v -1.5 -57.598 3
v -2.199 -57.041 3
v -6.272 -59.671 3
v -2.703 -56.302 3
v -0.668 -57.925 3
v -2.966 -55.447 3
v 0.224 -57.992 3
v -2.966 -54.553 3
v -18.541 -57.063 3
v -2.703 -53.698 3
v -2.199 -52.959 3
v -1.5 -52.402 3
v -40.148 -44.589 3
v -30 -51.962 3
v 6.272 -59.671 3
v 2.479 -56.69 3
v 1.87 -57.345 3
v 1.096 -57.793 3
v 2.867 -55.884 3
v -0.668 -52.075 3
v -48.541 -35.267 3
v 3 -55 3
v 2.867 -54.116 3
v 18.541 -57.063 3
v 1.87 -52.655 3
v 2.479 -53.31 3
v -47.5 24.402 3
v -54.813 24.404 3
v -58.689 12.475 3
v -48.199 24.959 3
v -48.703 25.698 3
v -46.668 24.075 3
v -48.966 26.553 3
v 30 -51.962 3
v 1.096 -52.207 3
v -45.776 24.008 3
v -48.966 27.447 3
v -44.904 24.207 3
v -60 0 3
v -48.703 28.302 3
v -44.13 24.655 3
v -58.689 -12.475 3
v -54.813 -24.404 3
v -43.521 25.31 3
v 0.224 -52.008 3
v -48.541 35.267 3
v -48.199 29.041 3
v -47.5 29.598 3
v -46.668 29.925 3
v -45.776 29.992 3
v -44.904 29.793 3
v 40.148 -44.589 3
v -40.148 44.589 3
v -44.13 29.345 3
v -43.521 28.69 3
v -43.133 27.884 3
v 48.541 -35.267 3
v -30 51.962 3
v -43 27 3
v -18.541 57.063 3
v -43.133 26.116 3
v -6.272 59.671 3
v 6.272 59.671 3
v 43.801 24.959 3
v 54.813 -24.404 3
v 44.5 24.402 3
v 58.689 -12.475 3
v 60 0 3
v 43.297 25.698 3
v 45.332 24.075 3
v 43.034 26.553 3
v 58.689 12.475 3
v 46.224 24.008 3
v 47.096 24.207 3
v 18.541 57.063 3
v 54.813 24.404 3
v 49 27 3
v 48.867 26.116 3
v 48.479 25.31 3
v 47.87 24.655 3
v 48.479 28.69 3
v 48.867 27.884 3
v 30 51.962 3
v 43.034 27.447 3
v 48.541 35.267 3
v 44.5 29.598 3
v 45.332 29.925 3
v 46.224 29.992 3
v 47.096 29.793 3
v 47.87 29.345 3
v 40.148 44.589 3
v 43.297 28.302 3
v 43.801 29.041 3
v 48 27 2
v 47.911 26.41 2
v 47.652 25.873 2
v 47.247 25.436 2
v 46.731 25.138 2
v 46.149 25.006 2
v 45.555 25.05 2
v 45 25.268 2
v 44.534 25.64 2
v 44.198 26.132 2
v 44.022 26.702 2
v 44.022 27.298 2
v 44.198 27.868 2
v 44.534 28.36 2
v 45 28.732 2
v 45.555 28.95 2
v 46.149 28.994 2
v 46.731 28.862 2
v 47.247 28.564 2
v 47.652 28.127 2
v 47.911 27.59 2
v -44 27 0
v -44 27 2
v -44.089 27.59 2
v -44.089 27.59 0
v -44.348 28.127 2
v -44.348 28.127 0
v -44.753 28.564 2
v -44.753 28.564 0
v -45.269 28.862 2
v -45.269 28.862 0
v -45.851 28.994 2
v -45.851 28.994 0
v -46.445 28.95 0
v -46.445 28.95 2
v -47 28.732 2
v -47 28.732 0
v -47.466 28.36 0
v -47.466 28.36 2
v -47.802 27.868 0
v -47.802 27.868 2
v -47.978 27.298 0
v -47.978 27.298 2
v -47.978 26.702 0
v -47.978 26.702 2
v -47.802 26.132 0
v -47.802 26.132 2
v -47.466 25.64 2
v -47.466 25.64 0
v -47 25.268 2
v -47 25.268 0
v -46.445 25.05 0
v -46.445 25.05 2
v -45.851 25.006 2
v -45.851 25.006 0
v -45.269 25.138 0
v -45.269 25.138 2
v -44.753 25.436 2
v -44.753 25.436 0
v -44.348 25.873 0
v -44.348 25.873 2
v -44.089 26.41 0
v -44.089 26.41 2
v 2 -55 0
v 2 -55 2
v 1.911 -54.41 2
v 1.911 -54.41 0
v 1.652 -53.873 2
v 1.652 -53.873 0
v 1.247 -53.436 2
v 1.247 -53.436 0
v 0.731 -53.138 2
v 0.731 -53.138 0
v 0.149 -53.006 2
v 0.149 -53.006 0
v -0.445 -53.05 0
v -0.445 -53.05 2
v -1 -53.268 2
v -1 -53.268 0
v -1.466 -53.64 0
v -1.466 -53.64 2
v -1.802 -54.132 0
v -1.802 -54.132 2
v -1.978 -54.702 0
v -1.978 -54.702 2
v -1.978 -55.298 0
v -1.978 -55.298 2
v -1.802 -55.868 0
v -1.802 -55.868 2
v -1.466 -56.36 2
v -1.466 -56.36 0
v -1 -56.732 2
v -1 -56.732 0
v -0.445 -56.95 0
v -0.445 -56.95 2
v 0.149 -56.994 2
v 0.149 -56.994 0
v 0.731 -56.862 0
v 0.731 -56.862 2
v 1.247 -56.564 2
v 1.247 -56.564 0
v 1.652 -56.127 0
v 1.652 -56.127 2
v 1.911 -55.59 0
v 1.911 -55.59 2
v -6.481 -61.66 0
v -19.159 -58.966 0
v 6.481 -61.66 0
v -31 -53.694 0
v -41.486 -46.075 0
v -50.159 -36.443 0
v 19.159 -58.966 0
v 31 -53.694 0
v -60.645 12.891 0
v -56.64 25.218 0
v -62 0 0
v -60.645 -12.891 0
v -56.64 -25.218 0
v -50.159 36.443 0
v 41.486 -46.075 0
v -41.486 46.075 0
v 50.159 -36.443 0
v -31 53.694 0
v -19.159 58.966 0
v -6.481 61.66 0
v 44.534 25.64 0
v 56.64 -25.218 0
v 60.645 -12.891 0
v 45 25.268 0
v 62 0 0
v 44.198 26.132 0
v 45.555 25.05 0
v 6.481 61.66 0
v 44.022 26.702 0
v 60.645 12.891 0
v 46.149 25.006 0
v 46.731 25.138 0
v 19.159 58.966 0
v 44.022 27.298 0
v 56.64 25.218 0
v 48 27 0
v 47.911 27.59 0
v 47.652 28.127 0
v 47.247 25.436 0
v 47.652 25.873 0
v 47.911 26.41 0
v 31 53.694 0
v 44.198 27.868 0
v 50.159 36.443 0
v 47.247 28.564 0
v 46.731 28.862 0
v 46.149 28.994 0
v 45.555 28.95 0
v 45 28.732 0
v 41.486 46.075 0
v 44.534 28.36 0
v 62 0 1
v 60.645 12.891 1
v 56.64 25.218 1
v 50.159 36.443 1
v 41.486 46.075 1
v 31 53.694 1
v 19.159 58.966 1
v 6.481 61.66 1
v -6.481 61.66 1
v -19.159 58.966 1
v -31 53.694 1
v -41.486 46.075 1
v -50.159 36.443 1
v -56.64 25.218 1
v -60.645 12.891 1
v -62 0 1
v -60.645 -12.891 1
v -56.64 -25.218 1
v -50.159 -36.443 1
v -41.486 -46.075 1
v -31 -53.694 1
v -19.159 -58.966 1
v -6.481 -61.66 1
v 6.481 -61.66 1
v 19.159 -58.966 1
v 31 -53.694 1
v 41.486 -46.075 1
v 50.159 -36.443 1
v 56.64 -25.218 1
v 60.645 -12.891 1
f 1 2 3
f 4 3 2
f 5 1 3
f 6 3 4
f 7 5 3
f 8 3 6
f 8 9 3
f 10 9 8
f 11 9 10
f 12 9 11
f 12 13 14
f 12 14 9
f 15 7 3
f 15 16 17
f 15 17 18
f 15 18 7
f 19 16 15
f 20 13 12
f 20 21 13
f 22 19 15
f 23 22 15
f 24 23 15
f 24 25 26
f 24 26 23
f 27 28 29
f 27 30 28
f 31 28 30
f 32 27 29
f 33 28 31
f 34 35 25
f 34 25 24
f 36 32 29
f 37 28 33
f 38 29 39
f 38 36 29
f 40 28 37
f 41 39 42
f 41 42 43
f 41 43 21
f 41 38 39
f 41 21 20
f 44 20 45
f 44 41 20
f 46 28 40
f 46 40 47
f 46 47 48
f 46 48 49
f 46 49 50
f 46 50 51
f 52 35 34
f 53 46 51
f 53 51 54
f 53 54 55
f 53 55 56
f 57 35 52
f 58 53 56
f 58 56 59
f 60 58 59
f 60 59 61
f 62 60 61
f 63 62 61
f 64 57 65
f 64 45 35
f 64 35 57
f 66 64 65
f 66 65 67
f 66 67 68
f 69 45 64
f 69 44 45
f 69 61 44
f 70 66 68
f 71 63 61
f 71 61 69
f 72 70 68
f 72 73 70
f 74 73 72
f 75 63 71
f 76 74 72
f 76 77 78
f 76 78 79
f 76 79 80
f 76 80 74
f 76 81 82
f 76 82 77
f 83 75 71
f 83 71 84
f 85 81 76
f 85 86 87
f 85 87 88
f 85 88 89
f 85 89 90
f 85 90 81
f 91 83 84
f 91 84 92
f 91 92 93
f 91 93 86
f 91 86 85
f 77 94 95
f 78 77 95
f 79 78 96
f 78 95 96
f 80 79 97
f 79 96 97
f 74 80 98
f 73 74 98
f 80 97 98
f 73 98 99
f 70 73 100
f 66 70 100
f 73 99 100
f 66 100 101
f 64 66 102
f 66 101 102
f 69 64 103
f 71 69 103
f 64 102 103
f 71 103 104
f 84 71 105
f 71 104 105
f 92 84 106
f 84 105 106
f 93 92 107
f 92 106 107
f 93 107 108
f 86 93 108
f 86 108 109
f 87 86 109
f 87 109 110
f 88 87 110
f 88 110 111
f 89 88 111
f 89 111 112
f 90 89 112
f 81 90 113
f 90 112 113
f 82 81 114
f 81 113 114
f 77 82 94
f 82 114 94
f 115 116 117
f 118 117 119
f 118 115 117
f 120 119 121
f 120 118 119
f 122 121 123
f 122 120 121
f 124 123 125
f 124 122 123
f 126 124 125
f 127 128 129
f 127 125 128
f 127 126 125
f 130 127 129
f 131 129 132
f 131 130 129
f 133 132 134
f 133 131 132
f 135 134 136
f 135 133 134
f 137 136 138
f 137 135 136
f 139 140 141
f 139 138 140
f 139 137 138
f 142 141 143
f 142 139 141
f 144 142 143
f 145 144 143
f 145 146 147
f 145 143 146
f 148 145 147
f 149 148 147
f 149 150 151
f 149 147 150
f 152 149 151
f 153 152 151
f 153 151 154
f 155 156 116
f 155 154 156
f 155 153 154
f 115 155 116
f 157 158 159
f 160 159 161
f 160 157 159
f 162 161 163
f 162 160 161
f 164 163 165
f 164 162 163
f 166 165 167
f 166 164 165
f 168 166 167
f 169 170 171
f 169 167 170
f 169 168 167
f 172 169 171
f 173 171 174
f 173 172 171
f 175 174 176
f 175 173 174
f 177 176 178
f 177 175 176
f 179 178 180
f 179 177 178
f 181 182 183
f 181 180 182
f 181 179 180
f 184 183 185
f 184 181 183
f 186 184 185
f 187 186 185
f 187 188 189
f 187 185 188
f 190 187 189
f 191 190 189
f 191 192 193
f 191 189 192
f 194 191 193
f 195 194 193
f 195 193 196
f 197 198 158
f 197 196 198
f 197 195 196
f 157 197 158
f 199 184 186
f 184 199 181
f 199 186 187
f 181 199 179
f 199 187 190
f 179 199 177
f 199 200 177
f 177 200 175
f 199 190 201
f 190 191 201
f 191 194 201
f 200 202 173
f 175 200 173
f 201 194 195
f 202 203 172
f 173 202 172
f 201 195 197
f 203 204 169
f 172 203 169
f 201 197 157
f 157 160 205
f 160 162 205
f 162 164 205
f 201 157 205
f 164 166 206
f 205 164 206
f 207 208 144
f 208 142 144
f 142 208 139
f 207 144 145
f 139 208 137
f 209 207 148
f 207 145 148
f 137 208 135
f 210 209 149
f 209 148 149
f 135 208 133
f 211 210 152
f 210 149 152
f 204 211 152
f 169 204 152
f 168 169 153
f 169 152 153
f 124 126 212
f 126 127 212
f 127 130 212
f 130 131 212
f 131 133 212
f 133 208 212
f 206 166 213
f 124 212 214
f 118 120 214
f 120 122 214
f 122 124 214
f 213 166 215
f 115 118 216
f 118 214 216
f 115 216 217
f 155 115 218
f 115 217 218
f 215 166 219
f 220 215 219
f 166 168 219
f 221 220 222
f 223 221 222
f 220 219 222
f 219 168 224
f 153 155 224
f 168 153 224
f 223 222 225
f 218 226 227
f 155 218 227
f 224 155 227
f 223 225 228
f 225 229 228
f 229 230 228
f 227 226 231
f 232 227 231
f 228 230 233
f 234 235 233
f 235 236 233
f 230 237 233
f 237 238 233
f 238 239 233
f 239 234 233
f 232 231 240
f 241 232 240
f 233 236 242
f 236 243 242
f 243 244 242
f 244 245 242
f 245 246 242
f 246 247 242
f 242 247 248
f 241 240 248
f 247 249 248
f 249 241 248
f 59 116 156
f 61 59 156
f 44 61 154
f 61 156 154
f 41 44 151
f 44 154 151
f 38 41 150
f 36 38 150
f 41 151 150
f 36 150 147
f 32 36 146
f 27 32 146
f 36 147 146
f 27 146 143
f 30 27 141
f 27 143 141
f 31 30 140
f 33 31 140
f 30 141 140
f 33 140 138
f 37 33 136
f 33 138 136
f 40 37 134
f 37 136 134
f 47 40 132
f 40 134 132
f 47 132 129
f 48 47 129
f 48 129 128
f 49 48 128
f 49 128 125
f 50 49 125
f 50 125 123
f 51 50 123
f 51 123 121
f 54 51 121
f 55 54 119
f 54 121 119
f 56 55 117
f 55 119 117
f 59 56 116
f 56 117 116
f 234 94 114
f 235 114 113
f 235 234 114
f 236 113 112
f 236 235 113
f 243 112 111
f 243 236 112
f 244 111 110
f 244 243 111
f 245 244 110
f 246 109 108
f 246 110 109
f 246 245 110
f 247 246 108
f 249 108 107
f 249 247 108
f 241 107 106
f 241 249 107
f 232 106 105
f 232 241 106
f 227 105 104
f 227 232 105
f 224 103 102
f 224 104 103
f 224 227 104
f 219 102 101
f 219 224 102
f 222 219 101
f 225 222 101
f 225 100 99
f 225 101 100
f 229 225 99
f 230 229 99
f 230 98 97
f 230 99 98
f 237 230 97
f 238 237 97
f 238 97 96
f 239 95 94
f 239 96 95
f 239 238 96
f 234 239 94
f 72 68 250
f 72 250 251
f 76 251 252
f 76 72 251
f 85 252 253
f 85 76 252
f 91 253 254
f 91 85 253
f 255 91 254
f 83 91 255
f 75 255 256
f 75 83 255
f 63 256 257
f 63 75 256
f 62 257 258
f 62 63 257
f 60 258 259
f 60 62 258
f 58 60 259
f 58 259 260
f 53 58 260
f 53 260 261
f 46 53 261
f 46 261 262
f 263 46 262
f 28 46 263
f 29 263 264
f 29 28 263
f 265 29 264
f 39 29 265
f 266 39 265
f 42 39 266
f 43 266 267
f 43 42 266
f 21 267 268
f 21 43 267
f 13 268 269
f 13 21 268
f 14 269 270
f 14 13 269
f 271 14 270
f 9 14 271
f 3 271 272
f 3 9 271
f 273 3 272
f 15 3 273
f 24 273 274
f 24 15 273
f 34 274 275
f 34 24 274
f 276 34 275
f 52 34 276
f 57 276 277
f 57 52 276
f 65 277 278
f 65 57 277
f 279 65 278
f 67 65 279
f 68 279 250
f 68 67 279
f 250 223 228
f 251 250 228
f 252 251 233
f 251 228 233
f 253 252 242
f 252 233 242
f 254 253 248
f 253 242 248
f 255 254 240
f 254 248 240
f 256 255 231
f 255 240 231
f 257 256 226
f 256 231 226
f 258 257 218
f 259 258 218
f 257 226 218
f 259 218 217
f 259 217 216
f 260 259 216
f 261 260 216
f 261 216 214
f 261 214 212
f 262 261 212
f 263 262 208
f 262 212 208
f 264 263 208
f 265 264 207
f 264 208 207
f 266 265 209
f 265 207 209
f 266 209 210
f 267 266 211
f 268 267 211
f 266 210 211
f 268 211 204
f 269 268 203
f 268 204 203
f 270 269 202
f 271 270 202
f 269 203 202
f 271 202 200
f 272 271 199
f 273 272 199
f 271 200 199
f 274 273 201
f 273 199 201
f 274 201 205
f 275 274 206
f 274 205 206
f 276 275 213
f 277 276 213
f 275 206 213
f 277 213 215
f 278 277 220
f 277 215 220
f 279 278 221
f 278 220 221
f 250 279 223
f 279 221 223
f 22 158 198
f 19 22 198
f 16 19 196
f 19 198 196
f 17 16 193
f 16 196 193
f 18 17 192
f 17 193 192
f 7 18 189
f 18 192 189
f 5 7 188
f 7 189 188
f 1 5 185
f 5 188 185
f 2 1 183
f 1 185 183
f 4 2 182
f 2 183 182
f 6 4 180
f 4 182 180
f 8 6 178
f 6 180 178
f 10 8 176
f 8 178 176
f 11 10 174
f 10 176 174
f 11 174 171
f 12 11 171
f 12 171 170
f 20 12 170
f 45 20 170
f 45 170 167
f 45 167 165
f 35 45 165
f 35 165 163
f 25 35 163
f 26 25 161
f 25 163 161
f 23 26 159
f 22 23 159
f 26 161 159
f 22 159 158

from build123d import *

# Parameters (mm, degrees)
CYLINDER003_R     = 2
CYLINDER003_DEPTH = 10
CYLINDER002_R     = 2
CYLINDER002_DEPTH = 10
CYLINDER001_R     = 2
CYLINDER001_DEPTH = 10
CYLINDER_R        = 62
CYLINDER_DEPTH    = 3
CHAMFER_SIZE      = 2
CHAMFER001_SIZE   = 1
CHAMFER002_SIZE   = 1
CHAMFER003_SIZE   = 1


with BuildPart() as cylinder003:
    # Cylinder003 → Cylinder003 (new body)
    with BuildSketch(Plane(origin=(-46, 27, 0), x_dir=(1, 0, 0), z_dir=(0, 0, 1))):
        Circle(CYLINDER003_R)
    extrude(amount=CYLINDER003_DEPTH)


with BuildPart() as cylinder002:
    # Cylinder002 → Cylinder002 (new body)
    with BuildSketch(Plane(origin=(46, 27, 0), x_dir=(1, 0, 0), z_dir=(0, 0, 1))):
        Circle(CYLINDER002_R)
    extrude(amount=CYLINDER002_DEPTH)


with BuildPart() as cylinder001:
    # Cylinder001 → Cylinder001 (new body)
    with BuildSketch(Plane(origin=(0, -55, 0), x_dir=(1, 0, 0), z_dir=(0, 0, 1))):
        Circle(CYLINDER001_R)
    extrude(amount=CYLINDER001_DEPTH)


with BuildPart() as cover_plate:
    # Cylinder → Cylinder (new body)
    with BuildSketch(Plane.XY):
        Circle(CYLINDER_R)
    extrude(amount=CYLINDER_DEPTH)

    # Cut: cut Cylinder001
    add(cylinder001.part, mode=Mode.SUBTRACT)

    # Cut001: cut Cylinder002
    add(cylinder002.part, mode=Mode.SUBTRACT)

    # Cut002: cut Cylinder003
    add(cylinder003.part, mode=Mode.SUBTRACT)

    # Chamfer
    chamfer_edges = [cover_plate.edges().sort_by_distance(p)[0] for p in [
        (-62, 0, 3),
    ]]
    chamfer(chamfer_edges, length=CHAMFER_SIZE)

    # Chamfer001
    chamfer001_edges = [cover_plate.edges().sort_by_distance(p)[0] for p in [
        (-48, 27, 3),
    ]]
    chamfer(chamfer001_edges, length=CHAMFER001_SIZE)

    # Chamfer002
    chamfer002_edges = [cover_plate.edges().sort_by_distance(p)[0] for p in [
        (44, 27, 3),
    ]]
    chamfer(chamfer002_edges, length=CHAMFER002_SIZE)

    # Chamfer003
    chamfer003_edges = [cover_plate.edges().sort_by_distance(p)[0] for p in [
        (-2, -55, 3),
    ]]
    chamfer(chamfer003_edges, length=CHAMFER003_SIZE)


solid = cover_plate.part
